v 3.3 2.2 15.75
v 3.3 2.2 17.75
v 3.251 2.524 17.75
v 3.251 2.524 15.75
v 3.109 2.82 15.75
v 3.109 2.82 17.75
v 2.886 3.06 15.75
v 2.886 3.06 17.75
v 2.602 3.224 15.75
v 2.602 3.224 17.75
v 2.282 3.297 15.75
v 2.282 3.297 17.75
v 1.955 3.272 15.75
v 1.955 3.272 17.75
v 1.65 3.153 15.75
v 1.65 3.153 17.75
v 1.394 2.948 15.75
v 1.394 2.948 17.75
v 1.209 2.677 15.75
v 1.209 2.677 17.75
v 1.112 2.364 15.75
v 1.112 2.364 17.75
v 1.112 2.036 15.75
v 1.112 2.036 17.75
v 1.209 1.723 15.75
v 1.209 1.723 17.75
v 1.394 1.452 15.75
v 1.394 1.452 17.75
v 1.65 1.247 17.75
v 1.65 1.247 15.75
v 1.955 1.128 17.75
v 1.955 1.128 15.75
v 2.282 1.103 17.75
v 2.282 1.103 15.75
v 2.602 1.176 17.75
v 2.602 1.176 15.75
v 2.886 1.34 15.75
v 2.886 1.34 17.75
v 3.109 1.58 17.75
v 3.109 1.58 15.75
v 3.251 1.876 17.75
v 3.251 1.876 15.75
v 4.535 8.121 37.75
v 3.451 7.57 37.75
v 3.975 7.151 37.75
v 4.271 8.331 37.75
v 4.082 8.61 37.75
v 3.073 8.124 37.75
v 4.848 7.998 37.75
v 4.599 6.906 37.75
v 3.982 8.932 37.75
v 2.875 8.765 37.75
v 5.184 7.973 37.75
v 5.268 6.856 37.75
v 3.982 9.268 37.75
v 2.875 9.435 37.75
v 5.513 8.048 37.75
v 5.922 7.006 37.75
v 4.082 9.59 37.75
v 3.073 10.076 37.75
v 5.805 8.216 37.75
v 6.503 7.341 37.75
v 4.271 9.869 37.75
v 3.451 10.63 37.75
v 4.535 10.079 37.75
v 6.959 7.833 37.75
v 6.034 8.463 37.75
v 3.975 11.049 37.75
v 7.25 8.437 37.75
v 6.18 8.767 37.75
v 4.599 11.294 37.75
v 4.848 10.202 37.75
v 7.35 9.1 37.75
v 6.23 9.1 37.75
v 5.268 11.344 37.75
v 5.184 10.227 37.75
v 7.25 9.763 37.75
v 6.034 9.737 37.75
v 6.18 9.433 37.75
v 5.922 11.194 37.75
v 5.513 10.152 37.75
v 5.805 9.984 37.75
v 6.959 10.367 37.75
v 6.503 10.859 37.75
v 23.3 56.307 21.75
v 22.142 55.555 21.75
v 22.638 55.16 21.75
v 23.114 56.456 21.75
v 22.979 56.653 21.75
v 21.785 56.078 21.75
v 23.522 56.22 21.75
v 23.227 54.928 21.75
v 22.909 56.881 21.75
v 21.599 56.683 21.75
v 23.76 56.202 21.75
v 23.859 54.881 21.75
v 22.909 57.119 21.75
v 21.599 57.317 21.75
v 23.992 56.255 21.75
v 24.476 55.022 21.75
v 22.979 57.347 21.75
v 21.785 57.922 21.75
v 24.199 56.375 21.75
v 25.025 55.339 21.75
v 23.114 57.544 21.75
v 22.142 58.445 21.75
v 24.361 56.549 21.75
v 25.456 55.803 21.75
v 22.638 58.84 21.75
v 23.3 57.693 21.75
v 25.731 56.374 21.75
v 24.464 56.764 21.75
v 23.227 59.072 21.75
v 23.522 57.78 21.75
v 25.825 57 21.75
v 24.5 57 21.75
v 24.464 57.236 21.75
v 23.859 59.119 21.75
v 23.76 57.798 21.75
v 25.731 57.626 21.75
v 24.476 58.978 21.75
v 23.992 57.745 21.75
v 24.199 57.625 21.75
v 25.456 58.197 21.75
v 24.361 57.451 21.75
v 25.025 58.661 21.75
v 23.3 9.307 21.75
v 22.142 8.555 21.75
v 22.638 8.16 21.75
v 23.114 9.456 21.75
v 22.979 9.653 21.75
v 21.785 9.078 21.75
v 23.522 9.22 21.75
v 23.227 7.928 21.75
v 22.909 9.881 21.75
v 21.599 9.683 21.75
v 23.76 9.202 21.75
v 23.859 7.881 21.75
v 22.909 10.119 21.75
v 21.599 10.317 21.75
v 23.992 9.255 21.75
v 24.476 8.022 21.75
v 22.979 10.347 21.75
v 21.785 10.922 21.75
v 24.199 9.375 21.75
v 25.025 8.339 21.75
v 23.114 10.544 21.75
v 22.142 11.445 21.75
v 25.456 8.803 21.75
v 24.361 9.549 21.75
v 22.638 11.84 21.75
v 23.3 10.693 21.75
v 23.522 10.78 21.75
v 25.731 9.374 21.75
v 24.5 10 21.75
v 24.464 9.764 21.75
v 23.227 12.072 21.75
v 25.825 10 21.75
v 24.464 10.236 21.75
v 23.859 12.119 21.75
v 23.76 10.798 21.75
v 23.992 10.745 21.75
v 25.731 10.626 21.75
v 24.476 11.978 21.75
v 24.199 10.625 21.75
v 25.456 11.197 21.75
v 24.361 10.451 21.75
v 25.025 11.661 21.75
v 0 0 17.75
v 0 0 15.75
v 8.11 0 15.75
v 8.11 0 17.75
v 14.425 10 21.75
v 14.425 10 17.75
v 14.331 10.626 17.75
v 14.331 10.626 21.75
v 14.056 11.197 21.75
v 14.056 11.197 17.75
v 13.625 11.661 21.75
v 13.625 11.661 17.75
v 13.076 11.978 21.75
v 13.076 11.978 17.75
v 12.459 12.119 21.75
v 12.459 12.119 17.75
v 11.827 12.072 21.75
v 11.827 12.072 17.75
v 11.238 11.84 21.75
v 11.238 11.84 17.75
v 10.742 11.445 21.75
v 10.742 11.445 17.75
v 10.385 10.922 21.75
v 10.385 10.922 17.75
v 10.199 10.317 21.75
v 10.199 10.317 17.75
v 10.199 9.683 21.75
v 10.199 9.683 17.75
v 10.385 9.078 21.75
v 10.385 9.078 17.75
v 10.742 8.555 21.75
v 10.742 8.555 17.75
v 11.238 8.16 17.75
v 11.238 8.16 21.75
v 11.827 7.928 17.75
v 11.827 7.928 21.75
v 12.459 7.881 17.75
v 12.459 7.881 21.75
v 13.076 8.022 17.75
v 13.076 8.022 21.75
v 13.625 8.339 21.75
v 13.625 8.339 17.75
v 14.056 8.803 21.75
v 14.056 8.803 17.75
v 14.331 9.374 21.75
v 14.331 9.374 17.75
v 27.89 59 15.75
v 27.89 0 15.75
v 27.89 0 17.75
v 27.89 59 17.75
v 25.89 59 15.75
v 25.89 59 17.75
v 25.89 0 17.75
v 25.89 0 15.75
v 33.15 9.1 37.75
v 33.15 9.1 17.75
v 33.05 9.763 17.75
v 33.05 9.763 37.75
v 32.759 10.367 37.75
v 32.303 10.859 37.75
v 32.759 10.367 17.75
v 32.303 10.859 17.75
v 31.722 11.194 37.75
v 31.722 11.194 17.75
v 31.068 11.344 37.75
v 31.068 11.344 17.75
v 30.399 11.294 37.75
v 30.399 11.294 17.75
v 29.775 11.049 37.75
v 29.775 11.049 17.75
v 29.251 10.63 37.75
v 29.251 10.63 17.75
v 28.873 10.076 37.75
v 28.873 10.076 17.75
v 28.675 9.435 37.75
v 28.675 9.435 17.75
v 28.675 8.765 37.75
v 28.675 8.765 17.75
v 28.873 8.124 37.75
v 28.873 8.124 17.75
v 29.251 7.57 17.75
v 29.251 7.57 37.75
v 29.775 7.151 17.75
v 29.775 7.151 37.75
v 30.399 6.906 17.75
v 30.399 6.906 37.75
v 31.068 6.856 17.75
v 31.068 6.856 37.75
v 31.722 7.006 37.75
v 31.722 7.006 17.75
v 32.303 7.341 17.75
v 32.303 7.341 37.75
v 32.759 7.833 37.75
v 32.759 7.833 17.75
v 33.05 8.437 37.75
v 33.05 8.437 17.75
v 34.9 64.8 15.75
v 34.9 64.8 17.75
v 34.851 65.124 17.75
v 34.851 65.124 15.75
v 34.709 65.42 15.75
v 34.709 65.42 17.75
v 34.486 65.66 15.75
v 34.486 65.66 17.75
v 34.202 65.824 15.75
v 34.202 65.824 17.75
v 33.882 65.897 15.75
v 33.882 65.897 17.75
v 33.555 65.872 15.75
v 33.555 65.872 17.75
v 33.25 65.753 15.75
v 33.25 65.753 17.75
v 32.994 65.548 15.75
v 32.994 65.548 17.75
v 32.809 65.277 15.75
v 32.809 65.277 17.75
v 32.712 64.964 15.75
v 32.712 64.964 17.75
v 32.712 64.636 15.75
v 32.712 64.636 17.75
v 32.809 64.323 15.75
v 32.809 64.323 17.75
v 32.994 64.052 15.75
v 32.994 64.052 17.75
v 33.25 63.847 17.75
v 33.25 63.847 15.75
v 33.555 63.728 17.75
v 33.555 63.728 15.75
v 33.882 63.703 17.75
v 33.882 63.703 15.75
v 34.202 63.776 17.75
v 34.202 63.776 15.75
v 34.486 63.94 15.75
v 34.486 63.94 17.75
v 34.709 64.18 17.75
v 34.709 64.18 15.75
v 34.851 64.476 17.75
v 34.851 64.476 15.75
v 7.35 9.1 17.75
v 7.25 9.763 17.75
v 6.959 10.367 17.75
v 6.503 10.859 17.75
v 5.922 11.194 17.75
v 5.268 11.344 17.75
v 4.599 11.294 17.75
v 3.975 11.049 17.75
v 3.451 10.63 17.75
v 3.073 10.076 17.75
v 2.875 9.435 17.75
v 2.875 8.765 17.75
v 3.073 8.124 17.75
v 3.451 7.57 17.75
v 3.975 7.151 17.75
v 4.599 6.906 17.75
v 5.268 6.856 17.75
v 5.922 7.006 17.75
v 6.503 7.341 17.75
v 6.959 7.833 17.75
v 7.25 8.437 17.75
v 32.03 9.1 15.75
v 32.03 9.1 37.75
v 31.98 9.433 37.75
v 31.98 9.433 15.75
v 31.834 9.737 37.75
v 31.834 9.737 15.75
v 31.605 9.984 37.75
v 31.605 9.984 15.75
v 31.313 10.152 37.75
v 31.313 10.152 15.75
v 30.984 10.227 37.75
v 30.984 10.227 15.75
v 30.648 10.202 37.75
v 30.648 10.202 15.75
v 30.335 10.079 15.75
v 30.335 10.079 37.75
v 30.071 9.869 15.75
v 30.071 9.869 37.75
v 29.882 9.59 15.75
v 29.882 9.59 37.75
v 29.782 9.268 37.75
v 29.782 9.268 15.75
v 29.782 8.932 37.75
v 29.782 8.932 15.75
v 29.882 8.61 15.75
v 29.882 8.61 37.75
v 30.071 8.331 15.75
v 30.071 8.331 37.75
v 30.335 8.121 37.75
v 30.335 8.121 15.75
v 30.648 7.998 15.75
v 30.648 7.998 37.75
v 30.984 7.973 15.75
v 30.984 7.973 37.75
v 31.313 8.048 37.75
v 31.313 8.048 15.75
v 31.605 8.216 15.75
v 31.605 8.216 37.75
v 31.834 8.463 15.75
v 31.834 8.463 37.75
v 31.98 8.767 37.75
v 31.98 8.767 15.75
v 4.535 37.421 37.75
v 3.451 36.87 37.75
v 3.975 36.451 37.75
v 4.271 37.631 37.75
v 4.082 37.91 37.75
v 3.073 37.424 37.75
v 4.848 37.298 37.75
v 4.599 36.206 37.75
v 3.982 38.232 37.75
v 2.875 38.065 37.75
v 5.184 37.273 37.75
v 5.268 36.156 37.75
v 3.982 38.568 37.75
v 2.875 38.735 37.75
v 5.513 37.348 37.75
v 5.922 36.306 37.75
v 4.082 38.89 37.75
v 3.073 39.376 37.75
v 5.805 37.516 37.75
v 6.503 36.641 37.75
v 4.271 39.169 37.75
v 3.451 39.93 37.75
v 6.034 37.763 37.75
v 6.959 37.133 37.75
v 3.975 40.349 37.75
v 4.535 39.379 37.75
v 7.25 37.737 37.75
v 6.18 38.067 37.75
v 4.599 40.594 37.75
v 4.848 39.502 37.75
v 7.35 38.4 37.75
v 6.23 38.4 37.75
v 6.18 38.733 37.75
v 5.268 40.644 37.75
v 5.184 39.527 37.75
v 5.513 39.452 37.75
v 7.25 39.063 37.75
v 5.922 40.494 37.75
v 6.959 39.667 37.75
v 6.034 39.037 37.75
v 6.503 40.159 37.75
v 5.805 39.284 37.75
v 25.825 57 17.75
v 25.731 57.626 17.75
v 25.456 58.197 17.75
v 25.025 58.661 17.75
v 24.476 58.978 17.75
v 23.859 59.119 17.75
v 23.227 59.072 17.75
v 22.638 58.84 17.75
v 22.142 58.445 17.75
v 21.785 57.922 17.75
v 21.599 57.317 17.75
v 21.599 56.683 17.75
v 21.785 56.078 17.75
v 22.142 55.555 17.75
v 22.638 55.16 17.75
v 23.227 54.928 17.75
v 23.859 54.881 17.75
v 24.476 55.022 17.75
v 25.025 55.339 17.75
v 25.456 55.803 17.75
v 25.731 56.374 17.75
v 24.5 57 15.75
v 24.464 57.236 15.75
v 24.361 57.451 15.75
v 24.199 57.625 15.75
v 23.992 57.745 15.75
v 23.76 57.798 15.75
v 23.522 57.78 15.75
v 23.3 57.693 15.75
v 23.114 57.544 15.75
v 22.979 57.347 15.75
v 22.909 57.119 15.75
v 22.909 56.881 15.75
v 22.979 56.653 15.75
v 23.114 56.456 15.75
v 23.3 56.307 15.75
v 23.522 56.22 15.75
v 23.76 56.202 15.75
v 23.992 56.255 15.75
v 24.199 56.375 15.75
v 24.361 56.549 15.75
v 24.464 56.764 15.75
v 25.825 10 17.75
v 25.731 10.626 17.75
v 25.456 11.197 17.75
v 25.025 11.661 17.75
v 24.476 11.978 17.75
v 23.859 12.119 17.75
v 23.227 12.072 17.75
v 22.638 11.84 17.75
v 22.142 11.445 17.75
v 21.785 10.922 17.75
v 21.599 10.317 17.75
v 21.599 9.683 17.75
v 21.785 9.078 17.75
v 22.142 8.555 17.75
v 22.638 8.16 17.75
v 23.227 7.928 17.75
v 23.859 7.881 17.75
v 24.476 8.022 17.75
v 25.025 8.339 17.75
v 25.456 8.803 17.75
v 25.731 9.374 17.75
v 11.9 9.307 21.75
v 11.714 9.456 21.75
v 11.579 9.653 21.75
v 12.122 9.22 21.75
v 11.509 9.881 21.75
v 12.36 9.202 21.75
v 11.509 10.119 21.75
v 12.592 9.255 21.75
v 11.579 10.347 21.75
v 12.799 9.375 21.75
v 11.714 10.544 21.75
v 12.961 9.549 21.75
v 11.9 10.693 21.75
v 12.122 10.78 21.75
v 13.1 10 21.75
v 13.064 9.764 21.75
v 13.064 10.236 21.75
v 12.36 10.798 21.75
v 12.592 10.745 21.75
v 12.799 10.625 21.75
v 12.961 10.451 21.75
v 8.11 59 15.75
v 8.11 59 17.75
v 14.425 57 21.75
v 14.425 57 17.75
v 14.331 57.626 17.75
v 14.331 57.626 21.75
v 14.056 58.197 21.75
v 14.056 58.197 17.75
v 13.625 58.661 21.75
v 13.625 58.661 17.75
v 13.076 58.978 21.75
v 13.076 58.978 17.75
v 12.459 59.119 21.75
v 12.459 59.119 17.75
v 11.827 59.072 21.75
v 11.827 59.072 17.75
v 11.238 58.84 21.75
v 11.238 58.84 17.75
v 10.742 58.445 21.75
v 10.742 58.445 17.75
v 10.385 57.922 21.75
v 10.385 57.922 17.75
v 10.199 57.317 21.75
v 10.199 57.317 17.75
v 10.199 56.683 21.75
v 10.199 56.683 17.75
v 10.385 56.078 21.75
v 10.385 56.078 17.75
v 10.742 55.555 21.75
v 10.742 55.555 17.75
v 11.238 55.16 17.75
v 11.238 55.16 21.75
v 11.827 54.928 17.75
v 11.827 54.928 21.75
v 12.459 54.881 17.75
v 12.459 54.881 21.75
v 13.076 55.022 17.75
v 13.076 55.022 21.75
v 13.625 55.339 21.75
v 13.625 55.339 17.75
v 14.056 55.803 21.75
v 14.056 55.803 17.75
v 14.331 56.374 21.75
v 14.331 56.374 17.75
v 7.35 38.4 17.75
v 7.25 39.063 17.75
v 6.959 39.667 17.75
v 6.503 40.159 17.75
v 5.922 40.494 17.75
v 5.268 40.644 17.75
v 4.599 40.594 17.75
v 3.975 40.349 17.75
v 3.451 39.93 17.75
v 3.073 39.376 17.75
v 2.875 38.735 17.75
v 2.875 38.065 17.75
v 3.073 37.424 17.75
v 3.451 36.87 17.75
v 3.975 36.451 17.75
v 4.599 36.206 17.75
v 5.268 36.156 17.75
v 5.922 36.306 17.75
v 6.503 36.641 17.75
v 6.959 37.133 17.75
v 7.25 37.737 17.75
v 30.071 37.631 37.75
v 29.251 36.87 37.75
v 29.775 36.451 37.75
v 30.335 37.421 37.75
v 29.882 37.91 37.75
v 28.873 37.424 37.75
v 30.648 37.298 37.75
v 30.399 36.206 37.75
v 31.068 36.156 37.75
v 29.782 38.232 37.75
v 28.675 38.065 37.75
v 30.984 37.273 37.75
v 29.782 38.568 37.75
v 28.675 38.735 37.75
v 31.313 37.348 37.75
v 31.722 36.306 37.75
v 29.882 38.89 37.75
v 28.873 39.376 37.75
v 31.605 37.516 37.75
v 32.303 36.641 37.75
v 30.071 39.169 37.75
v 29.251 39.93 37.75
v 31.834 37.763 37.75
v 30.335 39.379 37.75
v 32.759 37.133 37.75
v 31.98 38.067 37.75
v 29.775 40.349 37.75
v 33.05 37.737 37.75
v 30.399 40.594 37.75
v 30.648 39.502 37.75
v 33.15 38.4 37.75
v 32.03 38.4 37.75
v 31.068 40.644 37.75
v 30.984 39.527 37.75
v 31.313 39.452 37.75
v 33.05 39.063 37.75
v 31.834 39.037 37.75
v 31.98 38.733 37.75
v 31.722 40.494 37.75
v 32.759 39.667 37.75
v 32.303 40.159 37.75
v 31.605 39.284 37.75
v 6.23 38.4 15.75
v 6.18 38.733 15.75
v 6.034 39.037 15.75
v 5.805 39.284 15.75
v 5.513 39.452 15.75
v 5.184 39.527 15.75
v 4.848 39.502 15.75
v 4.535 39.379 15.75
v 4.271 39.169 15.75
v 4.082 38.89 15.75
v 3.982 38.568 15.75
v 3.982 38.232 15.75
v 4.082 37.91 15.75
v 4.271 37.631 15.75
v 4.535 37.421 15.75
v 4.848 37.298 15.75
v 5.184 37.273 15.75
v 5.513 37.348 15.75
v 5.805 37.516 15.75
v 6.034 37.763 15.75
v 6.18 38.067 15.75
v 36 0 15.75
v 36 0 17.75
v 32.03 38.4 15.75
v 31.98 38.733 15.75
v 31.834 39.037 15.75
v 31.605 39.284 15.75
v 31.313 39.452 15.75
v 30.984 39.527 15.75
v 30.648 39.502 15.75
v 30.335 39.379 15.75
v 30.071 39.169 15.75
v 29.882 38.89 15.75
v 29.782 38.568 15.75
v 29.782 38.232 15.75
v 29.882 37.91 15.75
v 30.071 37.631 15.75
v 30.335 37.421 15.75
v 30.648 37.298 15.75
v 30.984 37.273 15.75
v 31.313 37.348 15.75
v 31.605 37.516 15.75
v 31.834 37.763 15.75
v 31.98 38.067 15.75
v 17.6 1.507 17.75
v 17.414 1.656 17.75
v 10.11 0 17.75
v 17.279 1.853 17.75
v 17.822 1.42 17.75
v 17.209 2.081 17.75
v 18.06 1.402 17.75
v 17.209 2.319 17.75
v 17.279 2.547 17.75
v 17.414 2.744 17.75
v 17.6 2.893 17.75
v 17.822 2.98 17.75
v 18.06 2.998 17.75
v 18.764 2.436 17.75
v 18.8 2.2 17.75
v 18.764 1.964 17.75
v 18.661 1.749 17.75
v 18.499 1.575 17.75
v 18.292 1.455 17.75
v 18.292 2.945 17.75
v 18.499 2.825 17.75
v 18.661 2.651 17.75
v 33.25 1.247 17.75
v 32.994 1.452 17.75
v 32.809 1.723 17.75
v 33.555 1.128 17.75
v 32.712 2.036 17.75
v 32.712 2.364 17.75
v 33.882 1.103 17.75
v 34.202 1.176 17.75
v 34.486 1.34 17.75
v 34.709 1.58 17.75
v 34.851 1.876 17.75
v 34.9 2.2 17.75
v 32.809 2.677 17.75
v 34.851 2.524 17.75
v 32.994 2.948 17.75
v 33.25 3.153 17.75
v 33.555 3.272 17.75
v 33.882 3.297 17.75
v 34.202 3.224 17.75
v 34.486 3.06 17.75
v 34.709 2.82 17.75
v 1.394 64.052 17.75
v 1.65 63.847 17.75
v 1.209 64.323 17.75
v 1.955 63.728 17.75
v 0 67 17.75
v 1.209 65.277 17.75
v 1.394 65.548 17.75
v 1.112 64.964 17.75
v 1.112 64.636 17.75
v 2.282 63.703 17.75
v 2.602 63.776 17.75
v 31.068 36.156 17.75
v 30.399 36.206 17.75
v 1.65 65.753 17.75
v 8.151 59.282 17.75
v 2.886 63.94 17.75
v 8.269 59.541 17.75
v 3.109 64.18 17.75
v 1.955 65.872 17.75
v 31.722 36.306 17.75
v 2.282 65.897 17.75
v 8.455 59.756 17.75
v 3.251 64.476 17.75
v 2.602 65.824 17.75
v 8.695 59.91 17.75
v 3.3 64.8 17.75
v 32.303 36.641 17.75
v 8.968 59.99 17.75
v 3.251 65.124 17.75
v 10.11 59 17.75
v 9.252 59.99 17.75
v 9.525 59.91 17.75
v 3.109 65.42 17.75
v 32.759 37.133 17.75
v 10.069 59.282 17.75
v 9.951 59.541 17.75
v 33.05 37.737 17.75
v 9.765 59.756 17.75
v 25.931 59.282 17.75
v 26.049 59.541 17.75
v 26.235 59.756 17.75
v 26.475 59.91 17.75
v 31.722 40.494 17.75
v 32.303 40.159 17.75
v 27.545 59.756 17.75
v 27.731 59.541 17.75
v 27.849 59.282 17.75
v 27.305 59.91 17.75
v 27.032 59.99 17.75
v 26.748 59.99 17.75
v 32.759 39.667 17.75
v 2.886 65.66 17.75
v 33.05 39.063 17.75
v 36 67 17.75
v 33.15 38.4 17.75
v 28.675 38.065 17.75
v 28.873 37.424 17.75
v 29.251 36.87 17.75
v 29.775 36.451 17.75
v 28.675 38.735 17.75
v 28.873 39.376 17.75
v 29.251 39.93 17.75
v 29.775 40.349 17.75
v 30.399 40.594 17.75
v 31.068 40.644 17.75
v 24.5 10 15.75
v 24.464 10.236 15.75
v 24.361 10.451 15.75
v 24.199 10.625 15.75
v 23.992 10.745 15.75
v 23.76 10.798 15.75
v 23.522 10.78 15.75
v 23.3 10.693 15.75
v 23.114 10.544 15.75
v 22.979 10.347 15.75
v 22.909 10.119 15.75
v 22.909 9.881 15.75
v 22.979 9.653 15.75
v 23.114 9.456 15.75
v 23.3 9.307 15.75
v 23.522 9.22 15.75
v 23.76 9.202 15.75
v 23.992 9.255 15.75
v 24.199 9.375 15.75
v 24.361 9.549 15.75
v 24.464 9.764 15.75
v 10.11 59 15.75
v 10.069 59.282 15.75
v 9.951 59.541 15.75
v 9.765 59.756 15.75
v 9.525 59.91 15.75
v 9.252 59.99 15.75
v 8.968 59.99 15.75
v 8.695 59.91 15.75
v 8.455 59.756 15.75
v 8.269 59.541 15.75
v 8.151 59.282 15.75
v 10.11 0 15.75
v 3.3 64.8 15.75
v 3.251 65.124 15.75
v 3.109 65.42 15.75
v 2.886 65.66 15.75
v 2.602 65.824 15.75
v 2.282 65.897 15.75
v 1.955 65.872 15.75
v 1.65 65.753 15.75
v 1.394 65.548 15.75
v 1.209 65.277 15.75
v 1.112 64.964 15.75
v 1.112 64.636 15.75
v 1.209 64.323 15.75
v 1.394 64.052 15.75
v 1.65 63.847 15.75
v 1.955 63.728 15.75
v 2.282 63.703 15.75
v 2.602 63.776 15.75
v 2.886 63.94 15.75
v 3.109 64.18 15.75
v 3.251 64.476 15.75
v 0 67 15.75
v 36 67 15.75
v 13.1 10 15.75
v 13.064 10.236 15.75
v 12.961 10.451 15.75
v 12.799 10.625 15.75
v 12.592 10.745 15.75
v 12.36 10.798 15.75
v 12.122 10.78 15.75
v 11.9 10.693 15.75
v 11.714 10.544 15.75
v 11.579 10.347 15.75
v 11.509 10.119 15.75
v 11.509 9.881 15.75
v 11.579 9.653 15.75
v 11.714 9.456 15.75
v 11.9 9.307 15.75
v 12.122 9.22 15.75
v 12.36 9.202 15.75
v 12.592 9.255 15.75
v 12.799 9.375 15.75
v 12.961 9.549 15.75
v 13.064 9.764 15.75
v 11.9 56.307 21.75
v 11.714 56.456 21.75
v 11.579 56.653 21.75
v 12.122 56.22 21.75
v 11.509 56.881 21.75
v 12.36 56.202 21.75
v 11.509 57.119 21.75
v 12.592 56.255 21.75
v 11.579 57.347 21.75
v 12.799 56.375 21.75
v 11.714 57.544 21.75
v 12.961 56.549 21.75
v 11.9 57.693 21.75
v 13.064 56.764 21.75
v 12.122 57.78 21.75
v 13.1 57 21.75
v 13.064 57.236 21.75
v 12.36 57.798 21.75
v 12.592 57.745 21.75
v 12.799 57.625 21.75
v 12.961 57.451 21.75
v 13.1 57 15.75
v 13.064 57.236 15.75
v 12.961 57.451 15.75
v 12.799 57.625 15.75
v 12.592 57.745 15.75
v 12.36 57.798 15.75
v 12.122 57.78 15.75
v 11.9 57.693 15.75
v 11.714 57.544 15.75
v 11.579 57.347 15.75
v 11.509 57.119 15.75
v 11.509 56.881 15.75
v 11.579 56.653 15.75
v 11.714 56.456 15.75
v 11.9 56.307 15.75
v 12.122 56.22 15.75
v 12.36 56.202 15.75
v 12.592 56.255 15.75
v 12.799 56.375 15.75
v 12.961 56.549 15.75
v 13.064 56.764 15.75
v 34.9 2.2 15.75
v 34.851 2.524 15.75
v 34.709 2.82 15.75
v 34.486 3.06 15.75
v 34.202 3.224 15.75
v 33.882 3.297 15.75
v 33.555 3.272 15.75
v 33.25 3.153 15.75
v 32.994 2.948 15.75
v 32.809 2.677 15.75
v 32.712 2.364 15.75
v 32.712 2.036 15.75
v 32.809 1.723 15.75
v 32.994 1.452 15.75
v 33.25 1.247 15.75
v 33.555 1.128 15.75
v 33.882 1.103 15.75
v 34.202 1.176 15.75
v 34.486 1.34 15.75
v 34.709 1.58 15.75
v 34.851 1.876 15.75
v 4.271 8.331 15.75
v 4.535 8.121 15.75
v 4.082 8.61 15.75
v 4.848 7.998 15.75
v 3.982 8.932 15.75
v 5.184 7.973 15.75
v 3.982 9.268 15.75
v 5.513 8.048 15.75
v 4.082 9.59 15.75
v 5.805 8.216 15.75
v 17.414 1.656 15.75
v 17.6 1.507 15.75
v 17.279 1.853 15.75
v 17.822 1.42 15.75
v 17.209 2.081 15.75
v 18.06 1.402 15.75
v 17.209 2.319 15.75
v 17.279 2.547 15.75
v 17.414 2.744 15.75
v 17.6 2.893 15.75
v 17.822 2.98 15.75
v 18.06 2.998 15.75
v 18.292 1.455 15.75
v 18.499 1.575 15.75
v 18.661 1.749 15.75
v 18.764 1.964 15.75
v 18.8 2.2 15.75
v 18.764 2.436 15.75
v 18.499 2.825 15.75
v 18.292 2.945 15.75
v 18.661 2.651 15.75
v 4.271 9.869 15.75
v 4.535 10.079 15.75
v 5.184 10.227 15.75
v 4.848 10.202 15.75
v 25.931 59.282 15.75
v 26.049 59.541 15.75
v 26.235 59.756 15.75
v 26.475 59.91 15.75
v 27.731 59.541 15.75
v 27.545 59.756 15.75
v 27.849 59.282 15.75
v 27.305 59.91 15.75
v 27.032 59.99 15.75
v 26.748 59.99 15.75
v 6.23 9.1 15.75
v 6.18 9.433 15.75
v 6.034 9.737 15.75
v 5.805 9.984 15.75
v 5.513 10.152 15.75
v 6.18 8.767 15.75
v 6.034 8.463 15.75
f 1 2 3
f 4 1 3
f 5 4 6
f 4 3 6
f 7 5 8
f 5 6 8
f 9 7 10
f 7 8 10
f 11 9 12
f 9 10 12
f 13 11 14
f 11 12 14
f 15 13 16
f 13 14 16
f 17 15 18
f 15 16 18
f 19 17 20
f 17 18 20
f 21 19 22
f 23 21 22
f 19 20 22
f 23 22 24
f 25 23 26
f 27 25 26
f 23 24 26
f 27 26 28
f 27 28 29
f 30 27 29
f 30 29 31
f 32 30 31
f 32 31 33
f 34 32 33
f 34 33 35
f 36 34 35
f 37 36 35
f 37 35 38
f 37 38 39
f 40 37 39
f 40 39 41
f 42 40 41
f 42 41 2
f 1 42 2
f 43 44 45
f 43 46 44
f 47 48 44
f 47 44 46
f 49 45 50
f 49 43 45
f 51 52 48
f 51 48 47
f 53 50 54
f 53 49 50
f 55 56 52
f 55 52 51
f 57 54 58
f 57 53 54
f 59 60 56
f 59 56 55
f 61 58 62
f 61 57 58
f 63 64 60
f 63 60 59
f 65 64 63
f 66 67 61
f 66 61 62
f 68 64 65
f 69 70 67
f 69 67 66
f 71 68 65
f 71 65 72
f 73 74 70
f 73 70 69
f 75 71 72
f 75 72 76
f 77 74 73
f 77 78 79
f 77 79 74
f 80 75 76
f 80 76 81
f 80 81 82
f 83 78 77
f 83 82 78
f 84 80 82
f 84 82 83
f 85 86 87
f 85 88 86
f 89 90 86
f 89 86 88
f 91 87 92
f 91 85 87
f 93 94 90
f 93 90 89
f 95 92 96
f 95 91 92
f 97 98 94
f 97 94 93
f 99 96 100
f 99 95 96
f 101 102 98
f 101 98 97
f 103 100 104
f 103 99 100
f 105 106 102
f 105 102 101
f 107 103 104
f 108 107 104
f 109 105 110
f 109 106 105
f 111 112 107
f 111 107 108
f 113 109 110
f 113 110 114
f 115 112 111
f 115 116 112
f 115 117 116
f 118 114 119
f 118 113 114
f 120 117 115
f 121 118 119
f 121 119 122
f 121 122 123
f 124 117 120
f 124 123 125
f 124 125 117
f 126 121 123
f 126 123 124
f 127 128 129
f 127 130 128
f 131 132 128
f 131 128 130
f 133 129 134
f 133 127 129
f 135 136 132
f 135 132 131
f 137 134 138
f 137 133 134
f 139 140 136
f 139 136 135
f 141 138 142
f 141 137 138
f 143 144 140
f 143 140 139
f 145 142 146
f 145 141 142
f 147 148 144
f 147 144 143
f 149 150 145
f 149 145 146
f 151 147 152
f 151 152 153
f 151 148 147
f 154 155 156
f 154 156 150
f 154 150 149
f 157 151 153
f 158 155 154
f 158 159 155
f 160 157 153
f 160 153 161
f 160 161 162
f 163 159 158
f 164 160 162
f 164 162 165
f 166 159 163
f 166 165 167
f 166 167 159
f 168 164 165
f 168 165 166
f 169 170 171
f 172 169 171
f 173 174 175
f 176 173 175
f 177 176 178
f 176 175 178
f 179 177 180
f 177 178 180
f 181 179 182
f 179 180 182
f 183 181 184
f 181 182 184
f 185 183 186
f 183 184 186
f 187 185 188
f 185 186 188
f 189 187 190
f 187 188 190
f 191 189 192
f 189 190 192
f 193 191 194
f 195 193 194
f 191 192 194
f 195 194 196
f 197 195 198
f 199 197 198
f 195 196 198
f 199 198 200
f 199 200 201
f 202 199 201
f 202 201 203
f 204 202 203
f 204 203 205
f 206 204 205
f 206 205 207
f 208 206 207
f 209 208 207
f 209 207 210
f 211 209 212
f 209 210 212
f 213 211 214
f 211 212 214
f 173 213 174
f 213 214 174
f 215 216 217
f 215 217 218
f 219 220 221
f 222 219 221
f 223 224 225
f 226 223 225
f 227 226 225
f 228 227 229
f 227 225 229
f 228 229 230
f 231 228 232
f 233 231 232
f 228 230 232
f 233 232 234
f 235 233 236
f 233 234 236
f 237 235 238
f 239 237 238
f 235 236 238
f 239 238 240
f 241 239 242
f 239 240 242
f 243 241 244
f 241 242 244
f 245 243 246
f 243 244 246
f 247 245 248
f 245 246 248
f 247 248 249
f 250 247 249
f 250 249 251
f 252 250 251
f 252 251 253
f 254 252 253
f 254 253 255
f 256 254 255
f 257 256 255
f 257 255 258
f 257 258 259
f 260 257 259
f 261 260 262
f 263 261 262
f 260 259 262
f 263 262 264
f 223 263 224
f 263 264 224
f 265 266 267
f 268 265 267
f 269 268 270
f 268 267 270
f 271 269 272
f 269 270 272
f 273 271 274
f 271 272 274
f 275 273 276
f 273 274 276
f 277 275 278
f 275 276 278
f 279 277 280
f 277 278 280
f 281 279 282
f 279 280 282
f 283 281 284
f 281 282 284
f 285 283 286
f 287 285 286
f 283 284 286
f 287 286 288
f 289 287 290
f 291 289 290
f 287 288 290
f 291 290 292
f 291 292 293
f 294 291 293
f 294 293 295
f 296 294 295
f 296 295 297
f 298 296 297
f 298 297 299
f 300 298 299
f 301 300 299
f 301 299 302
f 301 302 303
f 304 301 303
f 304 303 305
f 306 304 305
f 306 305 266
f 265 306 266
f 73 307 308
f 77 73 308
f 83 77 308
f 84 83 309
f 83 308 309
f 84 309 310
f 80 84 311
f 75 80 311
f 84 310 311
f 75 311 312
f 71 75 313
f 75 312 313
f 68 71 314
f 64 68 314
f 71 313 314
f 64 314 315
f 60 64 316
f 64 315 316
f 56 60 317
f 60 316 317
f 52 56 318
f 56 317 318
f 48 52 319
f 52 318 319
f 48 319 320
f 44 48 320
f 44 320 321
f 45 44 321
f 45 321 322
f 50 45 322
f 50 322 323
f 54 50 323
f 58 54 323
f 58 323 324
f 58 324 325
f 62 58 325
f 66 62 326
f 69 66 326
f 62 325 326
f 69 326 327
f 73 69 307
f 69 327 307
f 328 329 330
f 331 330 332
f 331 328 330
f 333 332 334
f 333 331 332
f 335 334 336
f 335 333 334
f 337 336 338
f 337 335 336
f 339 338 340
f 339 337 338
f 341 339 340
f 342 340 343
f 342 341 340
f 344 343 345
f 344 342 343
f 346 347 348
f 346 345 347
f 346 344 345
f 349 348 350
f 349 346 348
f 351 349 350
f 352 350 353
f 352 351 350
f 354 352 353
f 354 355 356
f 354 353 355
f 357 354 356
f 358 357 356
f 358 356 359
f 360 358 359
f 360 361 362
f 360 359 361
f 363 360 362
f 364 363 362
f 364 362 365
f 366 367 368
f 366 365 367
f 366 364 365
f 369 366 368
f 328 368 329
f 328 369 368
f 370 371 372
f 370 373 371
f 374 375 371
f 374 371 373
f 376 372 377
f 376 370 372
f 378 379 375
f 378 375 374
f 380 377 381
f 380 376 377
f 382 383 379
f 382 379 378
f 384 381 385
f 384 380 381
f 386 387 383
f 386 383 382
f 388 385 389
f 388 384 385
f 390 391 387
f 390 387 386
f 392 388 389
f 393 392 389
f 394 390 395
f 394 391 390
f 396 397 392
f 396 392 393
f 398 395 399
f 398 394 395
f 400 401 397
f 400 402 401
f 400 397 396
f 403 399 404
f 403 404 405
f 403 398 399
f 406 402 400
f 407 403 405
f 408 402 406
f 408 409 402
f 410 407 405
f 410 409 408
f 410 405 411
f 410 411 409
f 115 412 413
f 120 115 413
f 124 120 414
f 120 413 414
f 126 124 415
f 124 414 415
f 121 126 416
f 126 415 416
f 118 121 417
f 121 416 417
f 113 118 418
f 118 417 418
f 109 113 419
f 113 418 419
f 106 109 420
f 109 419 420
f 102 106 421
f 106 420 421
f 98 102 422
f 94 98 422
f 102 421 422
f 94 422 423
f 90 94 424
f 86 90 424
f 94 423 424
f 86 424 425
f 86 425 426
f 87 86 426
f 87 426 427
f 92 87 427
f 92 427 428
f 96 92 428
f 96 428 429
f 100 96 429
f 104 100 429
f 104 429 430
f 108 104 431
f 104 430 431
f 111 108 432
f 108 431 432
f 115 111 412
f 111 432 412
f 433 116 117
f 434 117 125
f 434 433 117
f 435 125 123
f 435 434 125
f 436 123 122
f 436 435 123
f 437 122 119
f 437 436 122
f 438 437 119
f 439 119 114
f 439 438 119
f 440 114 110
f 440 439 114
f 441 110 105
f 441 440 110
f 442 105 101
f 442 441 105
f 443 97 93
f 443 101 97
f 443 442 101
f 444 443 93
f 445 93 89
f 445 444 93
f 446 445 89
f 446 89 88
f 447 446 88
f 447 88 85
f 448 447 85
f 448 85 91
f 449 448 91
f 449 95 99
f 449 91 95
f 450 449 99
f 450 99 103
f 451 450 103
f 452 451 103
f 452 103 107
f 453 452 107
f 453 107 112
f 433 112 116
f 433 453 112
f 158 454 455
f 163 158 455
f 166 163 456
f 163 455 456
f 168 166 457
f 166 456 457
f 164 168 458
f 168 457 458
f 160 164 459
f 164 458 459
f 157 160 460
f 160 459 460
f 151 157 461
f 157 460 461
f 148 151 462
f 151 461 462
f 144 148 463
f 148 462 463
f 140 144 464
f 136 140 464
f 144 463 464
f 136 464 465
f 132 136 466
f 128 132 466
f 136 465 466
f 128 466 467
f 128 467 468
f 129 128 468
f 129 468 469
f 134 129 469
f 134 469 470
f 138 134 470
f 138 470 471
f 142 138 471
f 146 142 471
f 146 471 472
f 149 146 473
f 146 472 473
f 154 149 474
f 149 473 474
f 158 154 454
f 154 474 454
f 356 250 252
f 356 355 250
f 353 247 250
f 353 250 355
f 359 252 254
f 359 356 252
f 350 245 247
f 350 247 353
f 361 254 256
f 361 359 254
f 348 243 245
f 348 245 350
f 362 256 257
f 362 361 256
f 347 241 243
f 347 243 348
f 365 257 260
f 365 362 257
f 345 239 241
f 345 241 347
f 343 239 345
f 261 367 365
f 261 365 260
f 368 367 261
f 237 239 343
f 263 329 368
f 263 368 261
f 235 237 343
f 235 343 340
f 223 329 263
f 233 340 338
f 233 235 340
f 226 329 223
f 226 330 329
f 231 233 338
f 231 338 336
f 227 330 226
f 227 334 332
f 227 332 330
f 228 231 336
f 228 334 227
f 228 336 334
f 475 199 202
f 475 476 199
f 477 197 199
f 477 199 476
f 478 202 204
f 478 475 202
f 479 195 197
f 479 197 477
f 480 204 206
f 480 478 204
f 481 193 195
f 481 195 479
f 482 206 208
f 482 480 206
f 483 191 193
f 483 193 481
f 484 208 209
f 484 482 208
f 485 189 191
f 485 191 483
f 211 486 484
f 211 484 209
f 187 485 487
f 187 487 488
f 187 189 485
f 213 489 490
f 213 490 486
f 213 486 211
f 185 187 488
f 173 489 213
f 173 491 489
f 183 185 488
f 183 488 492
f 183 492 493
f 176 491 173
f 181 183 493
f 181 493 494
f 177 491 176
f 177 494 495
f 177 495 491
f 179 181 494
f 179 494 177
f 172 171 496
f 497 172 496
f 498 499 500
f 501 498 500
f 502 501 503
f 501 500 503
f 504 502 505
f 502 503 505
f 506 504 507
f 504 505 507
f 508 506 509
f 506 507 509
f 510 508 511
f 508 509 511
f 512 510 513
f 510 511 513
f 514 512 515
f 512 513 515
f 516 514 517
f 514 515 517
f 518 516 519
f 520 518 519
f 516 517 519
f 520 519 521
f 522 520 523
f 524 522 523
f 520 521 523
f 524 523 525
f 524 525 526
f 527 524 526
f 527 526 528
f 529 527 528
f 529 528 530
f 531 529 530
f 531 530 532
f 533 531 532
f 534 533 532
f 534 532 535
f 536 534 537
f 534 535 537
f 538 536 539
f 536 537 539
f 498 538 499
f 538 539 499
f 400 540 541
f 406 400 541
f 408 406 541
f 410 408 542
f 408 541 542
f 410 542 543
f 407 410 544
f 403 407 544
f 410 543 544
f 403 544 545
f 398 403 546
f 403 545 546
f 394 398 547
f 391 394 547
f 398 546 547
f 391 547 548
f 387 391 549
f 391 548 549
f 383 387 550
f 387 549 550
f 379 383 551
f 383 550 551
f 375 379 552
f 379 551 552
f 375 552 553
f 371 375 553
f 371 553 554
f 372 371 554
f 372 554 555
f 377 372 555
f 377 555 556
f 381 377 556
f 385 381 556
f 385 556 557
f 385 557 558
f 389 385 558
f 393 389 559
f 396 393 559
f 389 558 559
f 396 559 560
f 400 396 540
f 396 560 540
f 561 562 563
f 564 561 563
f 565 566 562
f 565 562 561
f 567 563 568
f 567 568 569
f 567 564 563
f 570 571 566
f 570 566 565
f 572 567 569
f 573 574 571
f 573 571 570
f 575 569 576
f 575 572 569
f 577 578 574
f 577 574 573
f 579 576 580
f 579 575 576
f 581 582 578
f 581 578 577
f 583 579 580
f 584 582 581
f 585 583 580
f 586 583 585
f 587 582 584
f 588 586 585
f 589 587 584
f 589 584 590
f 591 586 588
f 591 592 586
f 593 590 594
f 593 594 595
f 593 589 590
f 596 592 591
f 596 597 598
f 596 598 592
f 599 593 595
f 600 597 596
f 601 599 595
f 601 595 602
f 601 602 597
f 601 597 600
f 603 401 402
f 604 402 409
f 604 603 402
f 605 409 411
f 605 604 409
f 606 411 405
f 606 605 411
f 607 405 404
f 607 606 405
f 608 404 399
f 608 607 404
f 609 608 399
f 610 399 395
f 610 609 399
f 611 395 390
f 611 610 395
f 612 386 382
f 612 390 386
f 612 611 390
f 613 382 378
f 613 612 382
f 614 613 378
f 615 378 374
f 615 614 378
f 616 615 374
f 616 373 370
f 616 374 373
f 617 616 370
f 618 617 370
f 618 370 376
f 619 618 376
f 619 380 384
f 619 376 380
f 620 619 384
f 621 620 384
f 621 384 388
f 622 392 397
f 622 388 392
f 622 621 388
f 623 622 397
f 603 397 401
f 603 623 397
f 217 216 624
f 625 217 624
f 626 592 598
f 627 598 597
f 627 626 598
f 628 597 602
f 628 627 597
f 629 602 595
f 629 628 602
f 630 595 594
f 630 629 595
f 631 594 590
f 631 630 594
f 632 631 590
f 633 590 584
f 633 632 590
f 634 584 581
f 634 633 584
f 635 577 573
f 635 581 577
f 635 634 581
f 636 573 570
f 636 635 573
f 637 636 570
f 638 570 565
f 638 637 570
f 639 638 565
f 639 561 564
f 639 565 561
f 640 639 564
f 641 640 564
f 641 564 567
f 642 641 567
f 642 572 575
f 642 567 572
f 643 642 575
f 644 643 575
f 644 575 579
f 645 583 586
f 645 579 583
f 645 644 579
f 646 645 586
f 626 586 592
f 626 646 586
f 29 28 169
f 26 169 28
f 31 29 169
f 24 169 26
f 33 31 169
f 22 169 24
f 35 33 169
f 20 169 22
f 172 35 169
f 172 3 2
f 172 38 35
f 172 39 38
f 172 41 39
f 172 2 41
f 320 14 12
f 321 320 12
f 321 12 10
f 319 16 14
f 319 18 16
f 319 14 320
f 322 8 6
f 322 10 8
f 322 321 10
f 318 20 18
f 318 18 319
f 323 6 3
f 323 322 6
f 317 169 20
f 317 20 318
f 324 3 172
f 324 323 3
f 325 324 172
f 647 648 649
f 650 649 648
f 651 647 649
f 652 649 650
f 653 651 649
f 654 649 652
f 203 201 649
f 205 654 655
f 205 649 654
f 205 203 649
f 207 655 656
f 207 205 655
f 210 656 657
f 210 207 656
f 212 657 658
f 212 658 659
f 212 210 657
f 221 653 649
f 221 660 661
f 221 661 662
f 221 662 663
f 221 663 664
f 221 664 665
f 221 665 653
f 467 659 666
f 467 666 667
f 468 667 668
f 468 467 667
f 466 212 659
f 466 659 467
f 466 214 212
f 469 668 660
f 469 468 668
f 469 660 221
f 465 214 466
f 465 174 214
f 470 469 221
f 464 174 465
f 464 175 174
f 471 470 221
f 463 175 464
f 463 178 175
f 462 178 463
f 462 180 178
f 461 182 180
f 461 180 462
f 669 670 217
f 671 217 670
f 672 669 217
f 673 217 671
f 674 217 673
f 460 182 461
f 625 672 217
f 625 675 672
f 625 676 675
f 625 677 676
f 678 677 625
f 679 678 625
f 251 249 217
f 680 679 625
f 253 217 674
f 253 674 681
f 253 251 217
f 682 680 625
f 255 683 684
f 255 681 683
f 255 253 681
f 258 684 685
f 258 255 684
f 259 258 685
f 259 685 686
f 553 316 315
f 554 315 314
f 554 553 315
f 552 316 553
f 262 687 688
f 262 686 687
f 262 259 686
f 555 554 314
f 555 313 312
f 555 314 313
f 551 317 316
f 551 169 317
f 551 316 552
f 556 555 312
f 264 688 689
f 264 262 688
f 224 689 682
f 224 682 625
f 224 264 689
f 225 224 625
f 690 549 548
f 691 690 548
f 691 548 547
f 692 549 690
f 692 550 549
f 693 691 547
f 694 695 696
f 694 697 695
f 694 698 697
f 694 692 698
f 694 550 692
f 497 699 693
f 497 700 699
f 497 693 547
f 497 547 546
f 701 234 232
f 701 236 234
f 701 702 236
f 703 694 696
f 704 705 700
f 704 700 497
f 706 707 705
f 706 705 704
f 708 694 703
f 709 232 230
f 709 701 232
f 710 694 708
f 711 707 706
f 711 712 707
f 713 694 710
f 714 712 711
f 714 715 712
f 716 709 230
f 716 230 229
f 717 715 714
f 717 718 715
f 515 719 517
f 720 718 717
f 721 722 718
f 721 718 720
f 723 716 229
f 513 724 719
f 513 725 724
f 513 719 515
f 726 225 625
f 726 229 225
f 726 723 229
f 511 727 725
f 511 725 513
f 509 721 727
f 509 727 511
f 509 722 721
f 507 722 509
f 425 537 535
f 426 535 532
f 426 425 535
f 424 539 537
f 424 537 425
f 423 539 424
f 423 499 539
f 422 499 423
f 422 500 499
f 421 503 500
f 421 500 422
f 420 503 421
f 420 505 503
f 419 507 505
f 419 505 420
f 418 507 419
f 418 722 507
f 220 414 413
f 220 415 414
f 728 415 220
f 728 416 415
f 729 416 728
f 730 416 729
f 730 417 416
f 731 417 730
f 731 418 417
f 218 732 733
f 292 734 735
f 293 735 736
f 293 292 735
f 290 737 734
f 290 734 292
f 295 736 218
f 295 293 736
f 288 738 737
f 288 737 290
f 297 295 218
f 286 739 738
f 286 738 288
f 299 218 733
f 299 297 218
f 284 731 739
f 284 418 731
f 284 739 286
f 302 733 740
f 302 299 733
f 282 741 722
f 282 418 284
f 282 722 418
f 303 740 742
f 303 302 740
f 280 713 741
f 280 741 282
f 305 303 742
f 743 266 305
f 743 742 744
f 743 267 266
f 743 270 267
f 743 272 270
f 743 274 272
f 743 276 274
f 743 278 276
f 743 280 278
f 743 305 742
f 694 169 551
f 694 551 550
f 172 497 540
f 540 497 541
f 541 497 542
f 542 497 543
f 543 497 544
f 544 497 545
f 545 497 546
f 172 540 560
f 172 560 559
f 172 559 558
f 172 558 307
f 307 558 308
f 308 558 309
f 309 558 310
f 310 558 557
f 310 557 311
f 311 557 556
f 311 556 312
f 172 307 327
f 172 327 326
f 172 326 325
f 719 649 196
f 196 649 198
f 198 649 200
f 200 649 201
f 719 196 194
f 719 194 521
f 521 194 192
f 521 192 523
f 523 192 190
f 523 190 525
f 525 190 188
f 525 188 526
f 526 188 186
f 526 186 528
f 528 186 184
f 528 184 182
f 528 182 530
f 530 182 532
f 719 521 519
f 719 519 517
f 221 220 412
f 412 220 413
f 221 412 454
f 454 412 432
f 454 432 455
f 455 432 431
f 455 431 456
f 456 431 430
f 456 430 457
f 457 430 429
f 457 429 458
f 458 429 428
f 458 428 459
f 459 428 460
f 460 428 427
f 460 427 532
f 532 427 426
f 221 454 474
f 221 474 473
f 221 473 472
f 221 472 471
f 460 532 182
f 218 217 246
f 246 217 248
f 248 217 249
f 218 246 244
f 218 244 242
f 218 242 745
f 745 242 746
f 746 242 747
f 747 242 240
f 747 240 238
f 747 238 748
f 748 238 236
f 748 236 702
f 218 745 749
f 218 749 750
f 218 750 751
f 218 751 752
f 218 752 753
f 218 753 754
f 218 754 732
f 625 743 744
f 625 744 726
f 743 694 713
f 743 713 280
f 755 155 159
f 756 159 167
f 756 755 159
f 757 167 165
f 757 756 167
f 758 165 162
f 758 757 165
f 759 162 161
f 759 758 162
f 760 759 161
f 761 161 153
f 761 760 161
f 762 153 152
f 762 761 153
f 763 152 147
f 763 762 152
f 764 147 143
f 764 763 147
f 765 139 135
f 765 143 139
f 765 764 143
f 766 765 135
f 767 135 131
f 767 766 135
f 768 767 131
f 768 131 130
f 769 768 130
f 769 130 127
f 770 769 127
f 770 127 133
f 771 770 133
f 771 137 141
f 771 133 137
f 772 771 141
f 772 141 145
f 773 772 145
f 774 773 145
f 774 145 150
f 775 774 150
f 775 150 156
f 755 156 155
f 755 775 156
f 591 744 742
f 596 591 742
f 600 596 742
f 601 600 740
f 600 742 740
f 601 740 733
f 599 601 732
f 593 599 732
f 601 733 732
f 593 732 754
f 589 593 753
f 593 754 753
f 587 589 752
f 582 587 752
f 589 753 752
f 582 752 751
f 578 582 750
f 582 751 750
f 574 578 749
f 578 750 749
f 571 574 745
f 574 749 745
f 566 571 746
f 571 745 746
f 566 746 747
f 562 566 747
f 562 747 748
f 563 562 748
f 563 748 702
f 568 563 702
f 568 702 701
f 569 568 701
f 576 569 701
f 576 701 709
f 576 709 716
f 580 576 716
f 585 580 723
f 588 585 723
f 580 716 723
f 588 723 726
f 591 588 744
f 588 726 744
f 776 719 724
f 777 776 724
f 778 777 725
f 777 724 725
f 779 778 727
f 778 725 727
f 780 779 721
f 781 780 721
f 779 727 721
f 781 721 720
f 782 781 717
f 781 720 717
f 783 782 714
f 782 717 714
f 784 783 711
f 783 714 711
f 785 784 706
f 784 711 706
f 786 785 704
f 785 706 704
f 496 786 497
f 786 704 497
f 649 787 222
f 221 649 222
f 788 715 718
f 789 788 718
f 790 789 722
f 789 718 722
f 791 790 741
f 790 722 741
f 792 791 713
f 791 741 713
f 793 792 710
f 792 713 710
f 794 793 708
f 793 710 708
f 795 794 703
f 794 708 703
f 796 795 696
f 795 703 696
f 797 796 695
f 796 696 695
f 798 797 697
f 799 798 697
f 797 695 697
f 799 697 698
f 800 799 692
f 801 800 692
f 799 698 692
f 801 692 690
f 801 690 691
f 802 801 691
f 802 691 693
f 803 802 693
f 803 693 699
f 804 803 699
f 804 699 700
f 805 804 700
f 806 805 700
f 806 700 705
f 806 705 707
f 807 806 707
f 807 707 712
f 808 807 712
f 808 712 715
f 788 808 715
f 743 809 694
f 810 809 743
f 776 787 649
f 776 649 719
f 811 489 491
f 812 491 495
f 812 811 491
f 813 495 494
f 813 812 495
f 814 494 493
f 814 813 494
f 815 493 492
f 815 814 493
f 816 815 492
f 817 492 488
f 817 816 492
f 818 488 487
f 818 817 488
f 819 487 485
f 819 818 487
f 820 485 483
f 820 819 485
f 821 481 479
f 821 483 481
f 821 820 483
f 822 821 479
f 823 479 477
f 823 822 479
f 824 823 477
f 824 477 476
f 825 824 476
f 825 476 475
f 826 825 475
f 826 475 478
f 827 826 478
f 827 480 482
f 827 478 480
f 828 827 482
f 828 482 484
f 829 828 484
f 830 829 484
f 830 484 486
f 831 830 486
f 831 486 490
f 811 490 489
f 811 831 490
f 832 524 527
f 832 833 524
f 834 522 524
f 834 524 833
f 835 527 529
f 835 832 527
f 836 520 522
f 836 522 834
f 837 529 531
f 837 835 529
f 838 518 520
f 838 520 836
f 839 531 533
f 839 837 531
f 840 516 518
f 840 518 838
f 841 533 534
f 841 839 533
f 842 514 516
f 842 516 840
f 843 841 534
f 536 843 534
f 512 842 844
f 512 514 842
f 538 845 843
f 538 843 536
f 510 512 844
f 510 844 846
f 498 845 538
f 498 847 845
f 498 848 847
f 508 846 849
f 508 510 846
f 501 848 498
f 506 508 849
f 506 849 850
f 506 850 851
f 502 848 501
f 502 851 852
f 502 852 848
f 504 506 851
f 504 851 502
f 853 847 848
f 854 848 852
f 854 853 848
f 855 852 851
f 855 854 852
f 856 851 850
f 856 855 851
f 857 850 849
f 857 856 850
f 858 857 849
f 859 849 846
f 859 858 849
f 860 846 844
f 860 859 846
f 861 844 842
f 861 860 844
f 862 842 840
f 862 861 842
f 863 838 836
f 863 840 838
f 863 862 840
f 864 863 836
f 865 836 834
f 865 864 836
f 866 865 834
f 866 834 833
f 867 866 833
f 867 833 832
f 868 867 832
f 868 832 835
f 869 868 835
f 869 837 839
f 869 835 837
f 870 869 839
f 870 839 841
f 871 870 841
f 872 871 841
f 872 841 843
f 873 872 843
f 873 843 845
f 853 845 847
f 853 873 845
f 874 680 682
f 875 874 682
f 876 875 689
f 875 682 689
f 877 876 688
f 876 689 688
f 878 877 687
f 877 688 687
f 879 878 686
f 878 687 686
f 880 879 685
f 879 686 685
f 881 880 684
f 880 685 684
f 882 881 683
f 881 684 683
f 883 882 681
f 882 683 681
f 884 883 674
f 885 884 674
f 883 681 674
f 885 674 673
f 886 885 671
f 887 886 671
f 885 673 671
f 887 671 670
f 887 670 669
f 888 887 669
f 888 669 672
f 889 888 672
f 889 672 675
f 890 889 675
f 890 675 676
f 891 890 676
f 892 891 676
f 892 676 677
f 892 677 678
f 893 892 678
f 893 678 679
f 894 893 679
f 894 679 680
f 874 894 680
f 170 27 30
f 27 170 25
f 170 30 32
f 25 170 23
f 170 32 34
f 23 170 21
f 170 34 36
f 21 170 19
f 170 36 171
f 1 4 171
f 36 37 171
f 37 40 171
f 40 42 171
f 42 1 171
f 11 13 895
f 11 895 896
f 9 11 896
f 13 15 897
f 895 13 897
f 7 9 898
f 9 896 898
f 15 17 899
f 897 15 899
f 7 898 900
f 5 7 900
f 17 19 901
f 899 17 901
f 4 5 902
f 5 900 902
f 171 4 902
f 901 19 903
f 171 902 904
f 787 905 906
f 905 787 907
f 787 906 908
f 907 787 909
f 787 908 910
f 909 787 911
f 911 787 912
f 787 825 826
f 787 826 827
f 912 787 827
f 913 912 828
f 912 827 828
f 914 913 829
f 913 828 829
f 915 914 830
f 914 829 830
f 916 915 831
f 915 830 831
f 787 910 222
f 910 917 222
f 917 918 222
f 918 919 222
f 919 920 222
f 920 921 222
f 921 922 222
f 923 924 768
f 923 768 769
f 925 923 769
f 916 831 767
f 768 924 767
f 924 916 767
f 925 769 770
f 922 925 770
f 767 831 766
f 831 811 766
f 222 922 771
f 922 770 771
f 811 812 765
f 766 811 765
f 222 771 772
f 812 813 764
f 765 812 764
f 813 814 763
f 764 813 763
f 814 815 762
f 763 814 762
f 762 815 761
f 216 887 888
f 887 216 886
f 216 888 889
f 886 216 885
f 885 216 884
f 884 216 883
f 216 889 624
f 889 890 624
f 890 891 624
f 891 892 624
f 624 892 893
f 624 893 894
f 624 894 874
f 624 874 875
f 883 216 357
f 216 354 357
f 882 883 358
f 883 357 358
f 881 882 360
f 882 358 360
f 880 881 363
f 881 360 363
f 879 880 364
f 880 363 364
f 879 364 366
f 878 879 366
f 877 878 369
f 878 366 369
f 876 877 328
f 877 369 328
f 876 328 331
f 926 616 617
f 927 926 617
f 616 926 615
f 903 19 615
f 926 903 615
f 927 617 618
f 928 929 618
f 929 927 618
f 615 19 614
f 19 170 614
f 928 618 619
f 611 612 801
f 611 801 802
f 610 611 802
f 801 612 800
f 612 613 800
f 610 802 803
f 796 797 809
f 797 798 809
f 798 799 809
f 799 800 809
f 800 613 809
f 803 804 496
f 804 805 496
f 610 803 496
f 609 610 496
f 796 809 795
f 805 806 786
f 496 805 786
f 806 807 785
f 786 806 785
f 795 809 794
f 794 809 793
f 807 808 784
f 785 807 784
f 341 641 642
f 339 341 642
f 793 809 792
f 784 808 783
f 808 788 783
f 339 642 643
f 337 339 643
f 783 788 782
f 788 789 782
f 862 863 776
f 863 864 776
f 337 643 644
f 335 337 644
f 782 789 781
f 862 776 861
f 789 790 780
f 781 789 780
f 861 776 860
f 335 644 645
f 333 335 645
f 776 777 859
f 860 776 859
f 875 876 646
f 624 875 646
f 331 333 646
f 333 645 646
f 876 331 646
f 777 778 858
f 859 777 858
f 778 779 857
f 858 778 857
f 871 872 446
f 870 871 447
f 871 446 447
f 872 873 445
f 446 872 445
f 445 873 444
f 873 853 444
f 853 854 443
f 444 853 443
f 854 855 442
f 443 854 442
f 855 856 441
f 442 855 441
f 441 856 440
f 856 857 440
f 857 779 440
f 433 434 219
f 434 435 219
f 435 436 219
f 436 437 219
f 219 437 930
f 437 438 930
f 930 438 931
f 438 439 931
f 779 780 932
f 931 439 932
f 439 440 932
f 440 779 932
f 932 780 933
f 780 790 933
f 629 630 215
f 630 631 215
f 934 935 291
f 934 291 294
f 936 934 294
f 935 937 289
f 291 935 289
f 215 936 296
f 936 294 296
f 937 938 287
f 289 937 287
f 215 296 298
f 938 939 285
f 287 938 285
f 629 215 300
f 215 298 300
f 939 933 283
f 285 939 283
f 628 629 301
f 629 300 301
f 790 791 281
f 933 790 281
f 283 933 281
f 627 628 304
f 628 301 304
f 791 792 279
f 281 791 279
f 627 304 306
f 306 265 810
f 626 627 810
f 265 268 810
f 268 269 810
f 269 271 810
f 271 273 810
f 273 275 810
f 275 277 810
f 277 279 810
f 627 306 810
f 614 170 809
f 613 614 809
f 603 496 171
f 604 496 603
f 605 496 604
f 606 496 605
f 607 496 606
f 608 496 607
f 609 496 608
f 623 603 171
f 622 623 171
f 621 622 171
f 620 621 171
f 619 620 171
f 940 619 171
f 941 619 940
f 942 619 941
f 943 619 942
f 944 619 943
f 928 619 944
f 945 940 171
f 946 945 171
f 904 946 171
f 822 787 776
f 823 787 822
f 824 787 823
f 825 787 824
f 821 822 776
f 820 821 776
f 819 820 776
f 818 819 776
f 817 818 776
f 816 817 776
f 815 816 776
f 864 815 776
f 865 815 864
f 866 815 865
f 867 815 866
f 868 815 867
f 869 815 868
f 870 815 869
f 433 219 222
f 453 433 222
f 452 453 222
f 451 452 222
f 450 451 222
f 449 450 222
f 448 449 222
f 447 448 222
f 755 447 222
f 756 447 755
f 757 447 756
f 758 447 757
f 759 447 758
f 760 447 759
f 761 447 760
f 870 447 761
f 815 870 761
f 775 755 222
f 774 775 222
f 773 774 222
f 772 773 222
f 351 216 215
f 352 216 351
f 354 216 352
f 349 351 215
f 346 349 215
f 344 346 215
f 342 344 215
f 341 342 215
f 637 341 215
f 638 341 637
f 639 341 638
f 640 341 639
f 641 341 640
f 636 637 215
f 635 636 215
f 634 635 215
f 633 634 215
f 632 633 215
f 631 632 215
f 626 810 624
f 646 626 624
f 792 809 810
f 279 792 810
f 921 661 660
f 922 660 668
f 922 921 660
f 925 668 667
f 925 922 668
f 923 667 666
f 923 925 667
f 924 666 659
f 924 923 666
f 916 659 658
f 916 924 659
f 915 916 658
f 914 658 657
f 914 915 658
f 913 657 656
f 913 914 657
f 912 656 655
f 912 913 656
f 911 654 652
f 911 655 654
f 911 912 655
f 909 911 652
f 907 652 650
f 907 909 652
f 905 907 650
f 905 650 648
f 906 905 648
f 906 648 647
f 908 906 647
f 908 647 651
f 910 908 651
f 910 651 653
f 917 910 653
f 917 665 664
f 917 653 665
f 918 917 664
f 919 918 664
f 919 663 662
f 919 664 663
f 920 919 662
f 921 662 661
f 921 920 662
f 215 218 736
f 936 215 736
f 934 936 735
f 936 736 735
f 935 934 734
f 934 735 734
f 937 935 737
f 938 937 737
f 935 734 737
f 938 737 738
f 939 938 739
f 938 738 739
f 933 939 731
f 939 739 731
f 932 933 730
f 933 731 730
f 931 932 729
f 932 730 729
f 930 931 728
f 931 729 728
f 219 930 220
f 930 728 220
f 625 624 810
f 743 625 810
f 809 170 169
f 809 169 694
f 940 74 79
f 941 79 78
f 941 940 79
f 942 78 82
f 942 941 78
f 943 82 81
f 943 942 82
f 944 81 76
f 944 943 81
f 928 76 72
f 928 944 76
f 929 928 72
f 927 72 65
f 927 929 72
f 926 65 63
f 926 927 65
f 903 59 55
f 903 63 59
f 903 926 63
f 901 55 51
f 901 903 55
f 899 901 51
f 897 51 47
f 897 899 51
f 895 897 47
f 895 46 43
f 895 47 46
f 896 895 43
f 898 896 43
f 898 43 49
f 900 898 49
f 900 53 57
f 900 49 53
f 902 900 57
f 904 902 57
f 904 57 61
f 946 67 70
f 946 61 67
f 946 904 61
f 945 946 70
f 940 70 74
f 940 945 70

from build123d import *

# Parameters (mm, degrees)
SKETCH006_W     = 36
SKETCH006_H     = 67
PAD003_DEPTH    = 2
SKETCH007_R     = 2.125
PAD004_DEPTH    = 4
SKETCH012_R     = 1.1
POCKET002_DEPTH = 2.001
SKETCH022_R     = 0.8
POCKET008_DEPTH = 6.001
SKETCH040_R     = 2.25
PAD024_DEPTH    = 20
SKETCH041_R     = 1.1303
POCKET012_DEPTH = 22.001
SKETCH047_R     = 0.8
SKETCH047_W     = 2
SKETCH047_H     = 33.5
POCKET_DEPTH    = 22.001


with BuildPart() as part:
    # Sketch006 → Pad003 (new body)
    with BuildSketch(Plane.XY):
        with Locations((18, 33.5)):
            Rectangle(SKETCH006_W, SKETCH006_H)
    extrude(amount=PAD003_DEPTH)

    # Sketch007 (on DatumPlane) → Pad004 (join)
    with BuildSketch(Plane.XY.offset(2)):
        with Locations((12.3, 57)):
            Circle(SKETCH007_R)
        with Locations((23.7, 57)):
            Circle(SKETCH007_R)
        with Locations((23.7, 10)):
            Circle(SKETCH007_R)
        with Locations((12.3, 10)):
            Circle(SKETCH007_R)
    extrude(amount=PAD004_DEPTH)

    # Sketch012 (on DatumPlane) → Pocket002 (cut, through all)
    with BuildSketch(Plane.XY.offset(2)):
        with Locations((2.2, 64.8)):
            Circle(SKETCH012_R)
        with Locations((33.8, 64.8)):
            Circle(SKETCH012_R)
        with Locations((33.8, 2.2)):
            Circle(SKETCH012_R)
        with Locations((2.2, 2.2)):
            Circle(SKETCH012_R)
        with BuildLine():
            ThreePointArc((10.11, 59), (9.11, 60), (8.11, 59))
            Line((8.11, 59), (8.11, 8))
            ThreePointArc((8.11, 8), (9.11, 7), (10.11, 8))
            Line((10.11, 8), (10.11, 59))
        make_face()
        with BuildLine():
            ThreePointArc((25.89, 8), (26.89, 7), (27.89, 8))
            Line((27.89, 8), (27.89, 59))
            ThreePointArc((27.89, 59), (26.89, 60), (25.89, 59))
            Line((25.89, 59), (25.89, 8))
        make_face()
    extrude(amount=-POCKET002_DEPTH, mode=Mode.SUBTRACT)

    # Sketch022 → Pocket008 (cut, through all)
    with BuildSketch(Plane.XY):
        with Locations((12.3, 10)):
            Circle(SKETCH022_R)
        with Locations((23.7, 10)):
            Circle(SKETCH022_R)
        with Locations((12.3, 57)):
            Circle(SKETCH022_R)
        with Locations((23.7, 57)):
            Circle(SKETCH022_R)
    extrude(amount=POCKET008_DEPTH, mode=Mode.SUBTRACT)

    # Sketch040 (on DatumPlane) → Pad024 (join)
    with BuildSketch(Plane.XY.offset(2)):
        with Locations((5.1, 9.1)):
            Circle(SKETCH040_R)
        with Locations((30.9, 9.1)):
            Circle(SKETCH040_R)
        with Locations((5.1, 38.4)):
            Circle(SKETCH040_R)
        with Locations((30.9, 38.4)):
            Circle(SKETCH040_R)
    extrude(amount=PAD024_DEPTH)

    # Sketch041 → Pocket012 (cut, through all)
    with BuildSketch(Plane.XY):
        with Locations((5.1, 38.4)):
            Circle(SKETCH041_R)
        with Locations((30.9, 38.4)):
            Circle(SKETCH041_R)
        with Locations((30.9, 9.1)):
            Circle(SKETCH041_R)
        with Locations((5.1, 9.1)):
            Circle(SKETCH041_R)
    extrude(amount=POCKET012_DEPTH, mode=Mode.SUBTRACT)

    # Sketch047 → Pocket (cut, through all)
    with BuildSketch(Plane.XY):
        with Locations((18, 2.2)):
            Circle(SKETCH047_R)
        with Locations((9.11, 16.75)):
            Rectangle(SKETCH047_W, SKETCH047_H)
        with Locations((26.89, 16.75)):
            Rectangle(SKETCH047_W, SKETCH047_H)
    extrude(amount=POCKET_DEPTH, mode=Mode.SUBTRACT)


with BuildPart() as part_1:
    # Body002 placement: moved
    add(part.part.moved(Location((0, 0, 15.75))))


solid = part_1.part
